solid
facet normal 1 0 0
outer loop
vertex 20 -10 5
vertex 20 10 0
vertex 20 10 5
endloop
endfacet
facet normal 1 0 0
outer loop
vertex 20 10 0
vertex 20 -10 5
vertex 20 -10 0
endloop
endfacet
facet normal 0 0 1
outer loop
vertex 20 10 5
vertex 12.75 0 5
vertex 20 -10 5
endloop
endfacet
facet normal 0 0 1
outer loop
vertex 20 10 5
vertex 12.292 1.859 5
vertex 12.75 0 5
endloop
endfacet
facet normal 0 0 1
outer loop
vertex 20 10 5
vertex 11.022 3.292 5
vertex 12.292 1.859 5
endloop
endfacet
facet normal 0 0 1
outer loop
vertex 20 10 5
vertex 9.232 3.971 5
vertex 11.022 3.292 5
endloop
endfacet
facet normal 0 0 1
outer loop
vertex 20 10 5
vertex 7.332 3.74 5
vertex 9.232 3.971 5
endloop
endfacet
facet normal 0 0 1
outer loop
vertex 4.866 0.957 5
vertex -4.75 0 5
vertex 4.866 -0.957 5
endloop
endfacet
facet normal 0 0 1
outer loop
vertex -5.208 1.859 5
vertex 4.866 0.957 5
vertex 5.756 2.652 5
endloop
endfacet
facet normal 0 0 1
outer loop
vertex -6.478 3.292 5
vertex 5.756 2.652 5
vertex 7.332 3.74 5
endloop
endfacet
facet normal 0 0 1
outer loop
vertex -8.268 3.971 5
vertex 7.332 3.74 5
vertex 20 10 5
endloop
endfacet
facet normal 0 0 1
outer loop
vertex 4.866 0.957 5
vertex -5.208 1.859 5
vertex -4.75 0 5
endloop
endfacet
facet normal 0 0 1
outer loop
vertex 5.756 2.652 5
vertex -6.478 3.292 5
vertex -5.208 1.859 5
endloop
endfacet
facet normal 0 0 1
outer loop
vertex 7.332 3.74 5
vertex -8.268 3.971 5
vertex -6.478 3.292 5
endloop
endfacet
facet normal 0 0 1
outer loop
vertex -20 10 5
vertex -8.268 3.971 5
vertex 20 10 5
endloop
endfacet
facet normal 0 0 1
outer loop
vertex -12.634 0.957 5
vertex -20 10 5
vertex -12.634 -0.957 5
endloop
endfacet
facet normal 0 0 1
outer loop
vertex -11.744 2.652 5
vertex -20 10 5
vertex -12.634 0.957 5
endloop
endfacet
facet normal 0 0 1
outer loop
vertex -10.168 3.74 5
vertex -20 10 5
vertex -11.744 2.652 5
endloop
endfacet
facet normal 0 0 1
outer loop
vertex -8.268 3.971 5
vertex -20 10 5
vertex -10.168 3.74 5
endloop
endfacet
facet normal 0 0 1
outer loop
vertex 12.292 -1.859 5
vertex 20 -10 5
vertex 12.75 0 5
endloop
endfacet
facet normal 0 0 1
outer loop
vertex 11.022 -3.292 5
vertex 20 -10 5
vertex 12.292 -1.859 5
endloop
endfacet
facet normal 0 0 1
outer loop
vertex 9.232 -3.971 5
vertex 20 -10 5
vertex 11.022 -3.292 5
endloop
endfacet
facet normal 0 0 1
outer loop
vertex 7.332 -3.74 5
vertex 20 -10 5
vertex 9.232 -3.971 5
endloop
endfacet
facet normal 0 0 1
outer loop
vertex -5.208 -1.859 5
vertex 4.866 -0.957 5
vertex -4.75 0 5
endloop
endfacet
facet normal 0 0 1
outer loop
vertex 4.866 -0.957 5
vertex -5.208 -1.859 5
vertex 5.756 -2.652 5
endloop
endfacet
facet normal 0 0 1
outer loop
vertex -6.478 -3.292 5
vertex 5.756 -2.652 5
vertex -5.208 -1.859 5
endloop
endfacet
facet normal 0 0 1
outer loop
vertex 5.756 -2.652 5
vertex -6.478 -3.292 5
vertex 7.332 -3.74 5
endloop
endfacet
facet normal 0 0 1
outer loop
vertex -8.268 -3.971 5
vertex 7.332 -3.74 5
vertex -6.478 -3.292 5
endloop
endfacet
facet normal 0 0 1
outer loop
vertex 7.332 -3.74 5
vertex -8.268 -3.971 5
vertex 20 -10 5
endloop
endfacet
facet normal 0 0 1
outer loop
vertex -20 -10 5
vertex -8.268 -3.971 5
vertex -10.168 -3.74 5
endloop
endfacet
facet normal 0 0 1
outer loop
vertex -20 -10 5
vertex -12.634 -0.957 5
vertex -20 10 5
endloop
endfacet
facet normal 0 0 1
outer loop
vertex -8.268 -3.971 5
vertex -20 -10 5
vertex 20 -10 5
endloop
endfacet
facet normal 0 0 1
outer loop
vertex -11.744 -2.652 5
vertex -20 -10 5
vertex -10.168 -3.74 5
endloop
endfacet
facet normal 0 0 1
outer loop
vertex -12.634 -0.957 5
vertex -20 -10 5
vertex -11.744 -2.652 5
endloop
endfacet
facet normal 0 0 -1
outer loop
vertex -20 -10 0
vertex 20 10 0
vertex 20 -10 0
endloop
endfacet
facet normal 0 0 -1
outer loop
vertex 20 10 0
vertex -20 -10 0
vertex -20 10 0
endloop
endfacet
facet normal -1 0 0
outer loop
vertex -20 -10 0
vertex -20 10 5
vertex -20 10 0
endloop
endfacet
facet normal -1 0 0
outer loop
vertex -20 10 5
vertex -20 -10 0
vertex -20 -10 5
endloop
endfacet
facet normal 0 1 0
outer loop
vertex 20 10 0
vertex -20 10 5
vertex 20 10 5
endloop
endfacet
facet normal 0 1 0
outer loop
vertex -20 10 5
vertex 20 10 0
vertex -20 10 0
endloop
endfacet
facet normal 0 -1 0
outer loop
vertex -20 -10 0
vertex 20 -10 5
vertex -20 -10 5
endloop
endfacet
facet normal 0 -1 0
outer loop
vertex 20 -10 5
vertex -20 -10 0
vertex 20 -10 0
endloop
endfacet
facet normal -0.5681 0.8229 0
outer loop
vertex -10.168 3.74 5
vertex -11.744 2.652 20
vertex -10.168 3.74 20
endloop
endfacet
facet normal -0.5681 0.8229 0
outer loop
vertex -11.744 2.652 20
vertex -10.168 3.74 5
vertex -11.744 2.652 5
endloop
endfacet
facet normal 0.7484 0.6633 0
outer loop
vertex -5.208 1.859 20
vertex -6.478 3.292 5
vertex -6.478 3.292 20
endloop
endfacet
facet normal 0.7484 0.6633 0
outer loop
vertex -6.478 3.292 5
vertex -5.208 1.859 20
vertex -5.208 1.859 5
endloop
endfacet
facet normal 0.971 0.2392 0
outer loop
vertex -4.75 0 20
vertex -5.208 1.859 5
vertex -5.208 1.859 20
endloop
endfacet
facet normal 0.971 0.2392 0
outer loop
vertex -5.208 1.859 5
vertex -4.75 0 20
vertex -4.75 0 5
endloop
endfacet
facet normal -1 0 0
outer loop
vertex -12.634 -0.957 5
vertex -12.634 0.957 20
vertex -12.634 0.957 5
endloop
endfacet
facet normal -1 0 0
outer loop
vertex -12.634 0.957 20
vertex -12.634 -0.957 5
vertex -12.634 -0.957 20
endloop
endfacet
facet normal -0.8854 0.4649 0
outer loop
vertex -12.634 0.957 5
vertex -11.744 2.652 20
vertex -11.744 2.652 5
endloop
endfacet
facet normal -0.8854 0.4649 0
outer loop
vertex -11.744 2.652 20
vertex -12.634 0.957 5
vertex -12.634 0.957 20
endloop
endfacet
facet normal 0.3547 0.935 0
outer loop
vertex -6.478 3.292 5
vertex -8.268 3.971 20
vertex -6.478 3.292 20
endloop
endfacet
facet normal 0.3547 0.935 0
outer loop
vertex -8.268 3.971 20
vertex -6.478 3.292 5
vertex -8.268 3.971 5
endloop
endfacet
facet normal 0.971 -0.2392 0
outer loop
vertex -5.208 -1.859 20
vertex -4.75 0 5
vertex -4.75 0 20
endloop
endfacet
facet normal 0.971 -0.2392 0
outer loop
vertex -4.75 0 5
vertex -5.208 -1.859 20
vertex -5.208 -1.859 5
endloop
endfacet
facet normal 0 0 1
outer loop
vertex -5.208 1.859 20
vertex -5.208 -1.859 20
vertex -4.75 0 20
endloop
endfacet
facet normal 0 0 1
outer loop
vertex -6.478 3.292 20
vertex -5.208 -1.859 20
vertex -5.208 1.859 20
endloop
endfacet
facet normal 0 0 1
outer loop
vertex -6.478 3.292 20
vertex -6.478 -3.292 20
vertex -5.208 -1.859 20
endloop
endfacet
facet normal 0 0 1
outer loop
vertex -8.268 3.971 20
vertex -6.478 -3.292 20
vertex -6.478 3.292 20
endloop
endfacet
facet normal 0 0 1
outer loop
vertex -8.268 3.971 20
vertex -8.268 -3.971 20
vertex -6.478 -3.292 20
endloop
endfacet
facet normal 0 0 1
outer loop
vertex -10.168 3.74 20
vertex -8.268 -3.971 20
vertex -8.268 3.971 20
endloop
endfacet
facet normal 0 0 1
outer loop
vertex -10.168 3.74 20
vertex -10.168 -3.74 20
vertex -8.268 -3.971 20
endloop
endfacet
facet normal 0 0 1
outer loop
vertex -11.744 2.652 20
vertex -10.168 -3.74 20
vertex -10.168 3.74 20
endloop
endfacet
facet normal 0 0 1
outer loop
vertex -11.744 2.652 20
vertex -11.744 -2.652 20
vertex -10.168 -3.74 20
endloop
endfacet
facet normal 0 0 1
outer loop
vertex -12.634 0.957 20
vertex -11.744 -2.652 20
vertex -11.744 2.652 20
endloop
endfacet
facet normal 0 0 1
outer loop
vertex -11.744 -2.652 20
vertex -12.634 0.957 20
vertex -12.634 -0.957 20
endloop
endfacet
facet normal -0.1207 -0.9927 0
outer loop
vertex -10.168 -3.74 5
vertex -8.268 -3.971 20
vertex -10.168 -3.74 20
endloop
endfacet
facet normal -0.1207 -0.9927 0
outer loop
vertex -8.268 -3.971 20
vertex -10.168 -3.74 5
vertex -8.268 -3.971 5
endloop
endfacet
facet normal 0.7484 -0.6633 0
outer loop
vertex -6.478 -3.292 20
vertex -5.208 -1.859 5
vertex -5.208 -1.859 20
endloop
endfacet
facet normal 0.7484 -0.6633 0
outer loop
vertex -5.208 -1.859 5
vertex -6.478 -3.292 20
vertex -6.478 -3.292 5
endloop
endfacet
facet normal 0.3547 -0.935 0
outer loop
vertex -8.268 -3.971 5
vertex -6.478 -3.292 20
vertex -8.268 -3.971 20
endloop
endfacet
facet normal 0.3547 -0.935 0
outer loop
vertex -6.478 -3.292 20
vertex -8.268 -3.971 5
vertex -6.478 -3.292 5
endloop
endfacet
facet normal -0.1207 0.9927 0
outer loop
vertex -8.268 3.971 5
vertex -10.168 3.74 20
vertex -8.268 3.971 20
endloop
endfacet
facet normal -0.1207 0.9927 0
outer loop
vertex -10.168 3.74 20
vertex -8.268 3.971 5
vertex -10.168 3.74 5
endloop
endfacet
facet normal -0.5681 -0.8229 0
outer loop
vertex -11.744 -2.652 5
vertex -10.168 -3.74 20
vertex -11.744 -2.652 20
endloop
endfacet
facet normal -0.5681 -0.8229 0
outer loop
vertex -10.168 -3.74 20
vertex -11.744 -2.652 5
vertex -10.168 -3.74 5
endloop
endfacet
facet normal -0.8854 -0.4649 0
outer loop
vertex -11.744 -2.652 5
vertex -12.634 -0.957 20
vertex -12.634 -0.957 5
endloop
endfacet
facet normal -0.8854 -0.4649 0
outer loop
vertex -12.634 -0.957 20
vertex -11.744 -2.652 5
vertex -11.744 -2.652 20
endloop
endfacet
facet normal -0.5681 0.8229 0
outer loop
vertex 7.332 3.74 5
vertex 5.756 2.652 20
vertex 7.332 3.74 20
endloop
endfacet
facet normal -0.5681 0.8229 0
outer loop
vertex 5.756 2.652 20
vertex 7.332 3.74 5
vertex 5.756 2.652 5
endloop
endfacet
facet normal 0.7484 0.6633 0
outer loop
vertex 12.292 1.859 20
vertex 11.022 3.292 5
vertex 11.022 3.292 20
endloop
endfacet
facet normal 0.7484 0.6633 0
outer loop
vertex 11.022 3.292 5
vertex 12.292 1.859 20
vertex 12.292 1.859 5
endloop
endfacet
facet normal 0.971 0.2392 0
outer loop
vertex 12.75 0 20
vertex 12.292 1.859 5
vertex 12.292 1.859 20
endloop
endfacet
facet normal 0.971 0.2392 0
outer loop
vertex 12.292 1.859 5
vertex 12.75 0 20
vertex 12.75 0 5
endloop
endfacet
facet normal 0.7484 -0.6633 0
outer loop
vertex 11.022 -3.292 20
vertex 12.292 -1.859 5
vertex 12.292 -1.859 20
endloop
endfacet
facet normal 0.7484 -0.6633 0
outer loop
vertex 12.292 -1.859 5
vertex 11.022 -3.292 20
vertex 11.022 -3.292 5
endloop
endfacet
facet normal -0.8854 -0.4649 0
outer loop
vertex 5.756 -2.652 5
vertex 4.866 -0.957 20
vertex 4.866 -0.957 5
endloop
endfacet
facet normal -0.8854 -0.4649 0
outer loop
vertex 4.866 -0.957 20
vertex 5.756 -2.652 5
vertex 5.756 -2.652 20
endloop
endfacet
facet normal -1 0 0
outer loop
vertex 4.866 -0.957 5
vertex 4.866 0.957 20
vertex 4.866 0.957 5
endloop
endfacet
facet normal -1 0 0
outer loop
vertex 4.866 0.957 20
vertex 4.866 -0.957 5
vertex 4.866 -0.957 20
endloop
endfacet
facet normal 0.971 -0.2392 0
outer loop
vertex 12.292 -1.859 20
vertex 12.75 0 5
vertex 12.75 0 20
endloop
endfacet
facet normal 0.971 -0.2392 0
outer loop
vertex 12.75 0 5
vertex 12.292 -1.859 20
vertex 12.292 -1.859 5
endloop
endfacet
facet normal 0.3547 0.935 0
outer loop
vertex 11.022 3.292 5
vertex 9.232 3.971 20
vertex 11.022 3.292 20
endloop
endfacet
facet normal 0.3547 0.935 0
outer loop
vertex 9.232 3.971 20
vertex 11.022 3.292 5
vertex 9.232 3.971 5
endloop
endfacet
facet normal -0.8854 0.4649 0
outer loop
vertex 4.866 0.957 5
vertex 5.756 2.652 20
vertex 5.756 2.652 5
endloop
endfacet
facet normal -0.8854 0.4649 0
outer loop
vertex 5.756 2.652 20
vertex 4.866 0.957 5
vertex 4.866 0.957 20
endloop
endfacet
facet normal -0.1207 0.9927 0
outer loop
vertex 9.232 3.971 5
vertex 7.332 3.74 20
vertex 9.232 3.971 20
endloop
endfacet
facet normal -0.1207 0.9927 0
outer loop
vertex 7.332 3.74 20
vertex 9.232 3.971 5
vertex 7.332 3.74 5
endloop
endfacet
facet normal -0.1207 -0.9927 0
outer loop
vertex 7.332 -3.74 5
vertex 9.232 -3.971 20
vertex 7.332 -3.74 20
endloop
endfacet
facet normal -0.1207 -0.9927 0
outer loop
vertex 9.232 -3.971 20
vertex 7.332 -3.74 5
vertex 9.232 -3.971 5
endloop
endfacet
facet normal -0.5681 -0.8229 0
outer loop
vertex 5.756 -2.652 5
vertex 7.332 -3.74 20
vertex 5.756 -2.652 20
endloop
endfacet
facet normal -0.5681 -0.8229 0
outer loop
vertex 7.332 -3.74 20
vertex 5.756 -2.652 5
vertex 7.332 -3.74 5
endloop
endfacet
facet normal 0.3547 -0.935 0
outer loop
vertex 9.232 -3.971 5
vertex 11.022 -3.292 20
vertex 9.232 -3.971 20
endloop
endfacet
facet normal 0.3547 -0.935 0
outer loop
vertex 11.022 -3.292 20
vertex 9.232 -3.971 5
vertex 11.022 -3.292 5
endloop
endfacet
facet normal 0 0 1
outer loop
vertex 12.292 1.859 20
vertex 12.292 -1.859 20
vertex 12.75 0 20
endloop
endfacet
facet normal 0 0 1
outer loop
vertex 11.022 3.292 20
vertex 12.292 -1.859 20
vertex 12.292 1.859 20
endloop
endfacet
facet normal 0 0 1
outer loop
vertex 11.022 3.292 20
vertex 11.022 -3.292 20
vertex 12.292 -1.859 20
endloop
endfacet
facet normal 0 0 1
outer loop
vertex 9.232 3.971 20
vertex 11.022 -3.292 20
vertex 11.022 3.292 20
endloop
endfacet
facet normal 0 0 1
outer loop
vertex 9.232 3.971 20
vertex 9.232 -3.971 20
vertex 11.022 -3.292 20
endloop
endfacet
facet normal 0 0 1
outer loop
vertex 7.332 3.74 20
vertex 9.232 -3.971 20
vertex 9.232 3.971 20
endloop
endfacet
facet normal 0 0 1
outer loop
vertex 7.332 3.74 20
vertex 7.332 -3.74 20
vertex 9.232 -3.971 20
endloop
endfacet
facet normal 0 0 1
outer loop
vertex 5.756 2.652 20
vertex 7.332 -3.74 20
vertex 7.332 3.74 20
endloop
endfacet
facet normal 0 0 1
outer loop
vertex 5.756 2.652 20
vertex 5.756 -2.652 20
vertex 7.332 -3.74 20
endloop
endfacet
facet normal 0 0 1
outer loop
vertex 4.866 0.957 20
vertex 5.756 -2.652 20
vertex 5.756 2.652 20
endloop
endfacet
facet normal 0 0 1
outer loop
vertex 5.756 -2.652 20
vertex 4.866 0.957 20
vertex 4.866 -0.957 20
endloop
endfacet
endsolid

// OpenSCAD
// file: params.scad
/*
 * Copyright (c) 2012 Haydn Vesta
 * 
 * See the file license.txt for copying permission.
 * 
 */

// GLOBAL
hole_radius = 5;
peg_radius = 4.5;

// MAGNET
mag_height = 6.4;
mag_ring_ir = 50;
mag_ring_or = 102;
mag_count = 16;

// BEARING
bearing_height = 17;
bearing_ir = 33;
bearing_or = 44;

// STATOR
stator_height = 20;
stator_inner_height = 10;
stator_bearing_inset = (stator_height/2) - 1;
stator_count = 6;
stator_incidence = 360/stator_count;
stator_radius = 115;
stator_tab_width = 10;
stator_tab_offset = 50;
stator_wiring_gap = 25;
stator_wiring_gap_inset = stator_radius - (stator_wiring_gap + 10);
stator_outer_tab_extrude = 15;
stator_outer_tab_width = 30;
stator_notch = 15;
stator_notch_width = 5;
coil_edge = 80;
coil_block_length = 70;

// ROTOR & ROTOR CAP
rotor_height = 10;
rotor_inner_height = 3;
rotor_radius = 105;
rotor_inner_diameter = 25;
rotor_count = 8;
rotor_incidence = 360/rotor_count;
rotor_tie_hole_offset = 30;
rotor_notch = 10;
rotor_notch_height = 2;

rotor_cap_radius = 50;
rotor_cap_peg_radius = 35;
rotor_cap_inner_radius = 10;
rotor_cap_height = 10;
rotor_cap_insert_height = 10;
rotor_cap_bearing_inset = (bearing_height + rotor_inner_height) - rotor_cap_height;
rotor_plate_height = 5;
blade_holder_edge = 20;

// ROTOR EDGE TIE
rotor_edge_tie_length = 40;
rotor_edge_tie_width = 20;
rotor_edge_tie_inner_height = 5;
rotor_edge_tie_height = 20;
rotor_edge_tie_peg_inset = 10;
// main file
/*
 * Copyright (c) 2012 Haydn Vesta
 * 
 * See the file license.txt for copying permission.
 *
 */

include <params.scad>

x_inset = rotor_edge_tie_peg_inset + (hole_radius / 4);

module rotor_edge_tie_raw() {
  cube([rotor_edge_tie_length, rotor_edge_tie_width, rotor_edge_tie_inner_height]);
  translate([x_inset, rotor_edge_tie_peg_inset, 0])
    cylinder(h=rotor_edge_tie_height, r=peg_radius - 0.5);
  translate([rotor_edge_tie_length - (x_inset), rotor_edge_tie_peg_inset, 0])
    cylinder(h=rotor_edge_tie_height, r=peg_radius - 0.5);
}

module rotor_edge_tie() {
  translate([rotor_edge_tie_length/-2, rotor_edge_tie_width/-2, 0])
    rotor_edge_tie_raw();
}

rotor_edge_tie();
